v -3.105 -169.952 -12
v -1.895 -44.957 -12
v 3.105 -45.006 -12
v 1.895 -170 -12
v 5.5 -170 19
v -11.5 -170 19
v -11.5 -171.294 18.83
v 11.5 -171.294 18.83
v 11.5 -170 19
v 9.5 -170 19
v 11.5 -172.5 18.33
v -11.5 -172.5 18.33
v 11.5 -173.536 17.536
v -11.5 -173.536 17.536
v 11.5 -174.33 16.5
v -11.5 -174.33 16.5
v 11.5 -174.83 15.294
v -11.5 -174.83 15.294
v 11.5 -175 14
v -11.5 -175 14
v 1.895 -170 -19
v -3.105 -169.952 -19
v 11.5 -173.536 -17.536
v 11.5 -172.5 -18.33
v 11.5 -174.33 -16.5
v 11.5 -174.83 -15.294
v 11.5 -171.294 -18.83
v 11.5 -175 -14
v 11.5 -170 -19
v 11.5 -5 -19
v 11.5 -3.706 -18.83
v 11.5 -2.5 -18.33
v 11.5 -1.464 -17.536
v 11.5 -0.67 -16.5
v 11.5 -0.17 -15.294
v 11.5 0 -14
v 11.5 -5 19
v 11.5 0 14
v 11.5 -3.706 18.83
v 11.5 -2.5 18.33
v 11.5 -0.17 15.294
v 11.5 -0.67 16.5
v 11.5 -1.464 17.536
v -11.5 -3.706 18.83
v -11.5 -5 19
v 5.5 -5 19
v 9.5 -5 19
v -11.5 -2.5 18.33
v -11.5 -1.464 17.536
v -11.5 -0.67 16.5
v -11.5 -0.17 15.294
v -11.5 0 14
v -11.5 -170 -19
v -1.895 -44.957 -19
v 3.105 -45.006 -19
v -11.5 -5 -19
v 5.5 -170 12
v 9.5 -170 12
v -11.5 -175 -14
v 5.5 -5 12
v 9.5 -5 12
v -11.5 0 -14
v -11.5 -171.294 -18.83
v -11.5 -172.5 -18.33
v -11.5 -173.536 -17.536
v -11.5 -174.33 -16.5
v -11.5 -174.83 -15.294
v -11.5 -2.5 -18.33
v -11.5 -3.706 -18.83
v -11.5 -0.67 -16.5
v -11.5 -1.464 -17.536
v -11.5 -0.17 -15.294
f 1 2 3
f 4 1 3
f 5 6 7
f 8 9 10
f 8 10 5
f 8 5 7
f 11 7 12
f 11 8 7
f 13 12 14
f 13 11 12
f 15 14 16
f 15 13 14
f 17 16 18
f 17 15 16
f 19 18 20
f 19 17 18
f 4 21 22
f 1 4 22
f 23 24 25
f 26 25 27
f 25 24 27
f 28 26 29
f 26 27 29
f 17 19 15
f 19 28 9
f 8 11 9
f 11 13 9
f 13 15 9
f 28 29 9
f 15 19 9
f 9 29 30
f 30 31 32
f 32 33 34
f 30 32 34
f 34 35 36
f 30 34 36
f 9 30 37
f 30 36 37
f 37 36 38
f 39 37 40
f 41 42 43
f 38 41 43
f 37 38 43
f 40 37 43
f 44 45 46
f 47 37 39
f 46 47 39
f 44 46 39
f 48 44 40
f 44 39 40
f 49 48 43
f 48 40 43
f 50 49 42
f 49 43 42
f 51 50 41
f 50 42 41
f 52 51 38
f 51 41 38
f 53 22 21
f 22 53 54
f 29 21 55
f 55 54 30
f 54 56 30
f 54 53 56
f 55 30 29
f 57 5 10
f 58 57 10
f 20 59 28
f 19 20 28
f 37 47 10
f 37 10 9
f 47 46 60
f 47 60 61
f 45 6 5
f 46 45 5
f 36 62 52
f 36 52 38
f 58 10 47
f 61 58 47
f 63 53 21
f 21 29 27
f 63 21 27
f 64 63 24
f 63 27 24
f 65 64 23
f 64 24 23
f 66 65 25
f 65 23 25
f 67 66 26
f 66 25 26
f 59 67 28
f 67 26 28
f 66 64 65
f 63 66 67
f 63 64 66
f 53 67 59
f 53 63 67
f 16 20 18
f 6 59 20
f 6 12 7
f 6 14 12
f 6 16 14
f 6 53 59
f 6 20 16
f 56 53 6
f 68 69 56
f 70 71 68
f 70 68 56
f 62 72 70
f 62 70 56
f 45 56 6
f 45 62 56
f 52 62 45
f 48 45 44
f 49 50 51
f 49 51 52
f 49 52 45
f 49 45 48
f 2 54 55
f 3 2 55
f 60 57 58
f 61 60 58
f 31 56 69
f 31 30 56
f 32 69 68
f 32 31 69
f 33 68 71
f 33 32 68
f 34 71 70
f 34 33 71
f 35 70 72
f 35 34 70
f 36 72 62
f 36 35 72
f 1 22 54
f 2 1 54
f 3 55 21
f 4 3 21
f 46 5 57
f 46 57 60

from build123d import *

# Parameters (mm, degrees)
F0_W     = 23
F0_H     = 38
F1_DEPTH = 175
F2_R     = 5
F4_DEPTH = 7
F5_W     = 4
F5_H     = 165
F6_DEPTH = 7


with BuildPart() as f1:
    # F0 (on Front) → F1 (new body)
    with BuildSketch(Plane.XZ):
        Rectangle(F0_W, F0_H)
    extrude(amount=F1_DEPTH)

    # F2
    f2_edges = [f1.edges().sort_by_distance(p)[0] for p in [
        (0, -175, 19),
        (0, -175, -19),
        (0, 0, 19),
        (0, 0, -19),
    ]]
    fillet(f2_edges, radius=F2_R)

    # F3 (on face) → F4 (cut)
    with BuildSketch(Plane(origin=(0, 0, -19), x_dir=(1, 0, 0), z_dir=(0, 0, -1))):
        Polygon((3.105181, 45.005862), (1.894584, 170), (-3.105181, 169.951576), (-1.894584, 44.957438), align=None)
    extrude(amount=-F4_DEPTH, mode=Mode.SUBTRACT)

    # F5 (on face) → F6 (cut)
    with BuildSketch(Plane.XY.offset(19)):
        with Locations((7.5, -87.5)):
            Rectangle(F5_W, F5_H)
    extrude(amount=-F6_DEPTH, mode=Mode.SUBTRACT)


solid = f1.part
